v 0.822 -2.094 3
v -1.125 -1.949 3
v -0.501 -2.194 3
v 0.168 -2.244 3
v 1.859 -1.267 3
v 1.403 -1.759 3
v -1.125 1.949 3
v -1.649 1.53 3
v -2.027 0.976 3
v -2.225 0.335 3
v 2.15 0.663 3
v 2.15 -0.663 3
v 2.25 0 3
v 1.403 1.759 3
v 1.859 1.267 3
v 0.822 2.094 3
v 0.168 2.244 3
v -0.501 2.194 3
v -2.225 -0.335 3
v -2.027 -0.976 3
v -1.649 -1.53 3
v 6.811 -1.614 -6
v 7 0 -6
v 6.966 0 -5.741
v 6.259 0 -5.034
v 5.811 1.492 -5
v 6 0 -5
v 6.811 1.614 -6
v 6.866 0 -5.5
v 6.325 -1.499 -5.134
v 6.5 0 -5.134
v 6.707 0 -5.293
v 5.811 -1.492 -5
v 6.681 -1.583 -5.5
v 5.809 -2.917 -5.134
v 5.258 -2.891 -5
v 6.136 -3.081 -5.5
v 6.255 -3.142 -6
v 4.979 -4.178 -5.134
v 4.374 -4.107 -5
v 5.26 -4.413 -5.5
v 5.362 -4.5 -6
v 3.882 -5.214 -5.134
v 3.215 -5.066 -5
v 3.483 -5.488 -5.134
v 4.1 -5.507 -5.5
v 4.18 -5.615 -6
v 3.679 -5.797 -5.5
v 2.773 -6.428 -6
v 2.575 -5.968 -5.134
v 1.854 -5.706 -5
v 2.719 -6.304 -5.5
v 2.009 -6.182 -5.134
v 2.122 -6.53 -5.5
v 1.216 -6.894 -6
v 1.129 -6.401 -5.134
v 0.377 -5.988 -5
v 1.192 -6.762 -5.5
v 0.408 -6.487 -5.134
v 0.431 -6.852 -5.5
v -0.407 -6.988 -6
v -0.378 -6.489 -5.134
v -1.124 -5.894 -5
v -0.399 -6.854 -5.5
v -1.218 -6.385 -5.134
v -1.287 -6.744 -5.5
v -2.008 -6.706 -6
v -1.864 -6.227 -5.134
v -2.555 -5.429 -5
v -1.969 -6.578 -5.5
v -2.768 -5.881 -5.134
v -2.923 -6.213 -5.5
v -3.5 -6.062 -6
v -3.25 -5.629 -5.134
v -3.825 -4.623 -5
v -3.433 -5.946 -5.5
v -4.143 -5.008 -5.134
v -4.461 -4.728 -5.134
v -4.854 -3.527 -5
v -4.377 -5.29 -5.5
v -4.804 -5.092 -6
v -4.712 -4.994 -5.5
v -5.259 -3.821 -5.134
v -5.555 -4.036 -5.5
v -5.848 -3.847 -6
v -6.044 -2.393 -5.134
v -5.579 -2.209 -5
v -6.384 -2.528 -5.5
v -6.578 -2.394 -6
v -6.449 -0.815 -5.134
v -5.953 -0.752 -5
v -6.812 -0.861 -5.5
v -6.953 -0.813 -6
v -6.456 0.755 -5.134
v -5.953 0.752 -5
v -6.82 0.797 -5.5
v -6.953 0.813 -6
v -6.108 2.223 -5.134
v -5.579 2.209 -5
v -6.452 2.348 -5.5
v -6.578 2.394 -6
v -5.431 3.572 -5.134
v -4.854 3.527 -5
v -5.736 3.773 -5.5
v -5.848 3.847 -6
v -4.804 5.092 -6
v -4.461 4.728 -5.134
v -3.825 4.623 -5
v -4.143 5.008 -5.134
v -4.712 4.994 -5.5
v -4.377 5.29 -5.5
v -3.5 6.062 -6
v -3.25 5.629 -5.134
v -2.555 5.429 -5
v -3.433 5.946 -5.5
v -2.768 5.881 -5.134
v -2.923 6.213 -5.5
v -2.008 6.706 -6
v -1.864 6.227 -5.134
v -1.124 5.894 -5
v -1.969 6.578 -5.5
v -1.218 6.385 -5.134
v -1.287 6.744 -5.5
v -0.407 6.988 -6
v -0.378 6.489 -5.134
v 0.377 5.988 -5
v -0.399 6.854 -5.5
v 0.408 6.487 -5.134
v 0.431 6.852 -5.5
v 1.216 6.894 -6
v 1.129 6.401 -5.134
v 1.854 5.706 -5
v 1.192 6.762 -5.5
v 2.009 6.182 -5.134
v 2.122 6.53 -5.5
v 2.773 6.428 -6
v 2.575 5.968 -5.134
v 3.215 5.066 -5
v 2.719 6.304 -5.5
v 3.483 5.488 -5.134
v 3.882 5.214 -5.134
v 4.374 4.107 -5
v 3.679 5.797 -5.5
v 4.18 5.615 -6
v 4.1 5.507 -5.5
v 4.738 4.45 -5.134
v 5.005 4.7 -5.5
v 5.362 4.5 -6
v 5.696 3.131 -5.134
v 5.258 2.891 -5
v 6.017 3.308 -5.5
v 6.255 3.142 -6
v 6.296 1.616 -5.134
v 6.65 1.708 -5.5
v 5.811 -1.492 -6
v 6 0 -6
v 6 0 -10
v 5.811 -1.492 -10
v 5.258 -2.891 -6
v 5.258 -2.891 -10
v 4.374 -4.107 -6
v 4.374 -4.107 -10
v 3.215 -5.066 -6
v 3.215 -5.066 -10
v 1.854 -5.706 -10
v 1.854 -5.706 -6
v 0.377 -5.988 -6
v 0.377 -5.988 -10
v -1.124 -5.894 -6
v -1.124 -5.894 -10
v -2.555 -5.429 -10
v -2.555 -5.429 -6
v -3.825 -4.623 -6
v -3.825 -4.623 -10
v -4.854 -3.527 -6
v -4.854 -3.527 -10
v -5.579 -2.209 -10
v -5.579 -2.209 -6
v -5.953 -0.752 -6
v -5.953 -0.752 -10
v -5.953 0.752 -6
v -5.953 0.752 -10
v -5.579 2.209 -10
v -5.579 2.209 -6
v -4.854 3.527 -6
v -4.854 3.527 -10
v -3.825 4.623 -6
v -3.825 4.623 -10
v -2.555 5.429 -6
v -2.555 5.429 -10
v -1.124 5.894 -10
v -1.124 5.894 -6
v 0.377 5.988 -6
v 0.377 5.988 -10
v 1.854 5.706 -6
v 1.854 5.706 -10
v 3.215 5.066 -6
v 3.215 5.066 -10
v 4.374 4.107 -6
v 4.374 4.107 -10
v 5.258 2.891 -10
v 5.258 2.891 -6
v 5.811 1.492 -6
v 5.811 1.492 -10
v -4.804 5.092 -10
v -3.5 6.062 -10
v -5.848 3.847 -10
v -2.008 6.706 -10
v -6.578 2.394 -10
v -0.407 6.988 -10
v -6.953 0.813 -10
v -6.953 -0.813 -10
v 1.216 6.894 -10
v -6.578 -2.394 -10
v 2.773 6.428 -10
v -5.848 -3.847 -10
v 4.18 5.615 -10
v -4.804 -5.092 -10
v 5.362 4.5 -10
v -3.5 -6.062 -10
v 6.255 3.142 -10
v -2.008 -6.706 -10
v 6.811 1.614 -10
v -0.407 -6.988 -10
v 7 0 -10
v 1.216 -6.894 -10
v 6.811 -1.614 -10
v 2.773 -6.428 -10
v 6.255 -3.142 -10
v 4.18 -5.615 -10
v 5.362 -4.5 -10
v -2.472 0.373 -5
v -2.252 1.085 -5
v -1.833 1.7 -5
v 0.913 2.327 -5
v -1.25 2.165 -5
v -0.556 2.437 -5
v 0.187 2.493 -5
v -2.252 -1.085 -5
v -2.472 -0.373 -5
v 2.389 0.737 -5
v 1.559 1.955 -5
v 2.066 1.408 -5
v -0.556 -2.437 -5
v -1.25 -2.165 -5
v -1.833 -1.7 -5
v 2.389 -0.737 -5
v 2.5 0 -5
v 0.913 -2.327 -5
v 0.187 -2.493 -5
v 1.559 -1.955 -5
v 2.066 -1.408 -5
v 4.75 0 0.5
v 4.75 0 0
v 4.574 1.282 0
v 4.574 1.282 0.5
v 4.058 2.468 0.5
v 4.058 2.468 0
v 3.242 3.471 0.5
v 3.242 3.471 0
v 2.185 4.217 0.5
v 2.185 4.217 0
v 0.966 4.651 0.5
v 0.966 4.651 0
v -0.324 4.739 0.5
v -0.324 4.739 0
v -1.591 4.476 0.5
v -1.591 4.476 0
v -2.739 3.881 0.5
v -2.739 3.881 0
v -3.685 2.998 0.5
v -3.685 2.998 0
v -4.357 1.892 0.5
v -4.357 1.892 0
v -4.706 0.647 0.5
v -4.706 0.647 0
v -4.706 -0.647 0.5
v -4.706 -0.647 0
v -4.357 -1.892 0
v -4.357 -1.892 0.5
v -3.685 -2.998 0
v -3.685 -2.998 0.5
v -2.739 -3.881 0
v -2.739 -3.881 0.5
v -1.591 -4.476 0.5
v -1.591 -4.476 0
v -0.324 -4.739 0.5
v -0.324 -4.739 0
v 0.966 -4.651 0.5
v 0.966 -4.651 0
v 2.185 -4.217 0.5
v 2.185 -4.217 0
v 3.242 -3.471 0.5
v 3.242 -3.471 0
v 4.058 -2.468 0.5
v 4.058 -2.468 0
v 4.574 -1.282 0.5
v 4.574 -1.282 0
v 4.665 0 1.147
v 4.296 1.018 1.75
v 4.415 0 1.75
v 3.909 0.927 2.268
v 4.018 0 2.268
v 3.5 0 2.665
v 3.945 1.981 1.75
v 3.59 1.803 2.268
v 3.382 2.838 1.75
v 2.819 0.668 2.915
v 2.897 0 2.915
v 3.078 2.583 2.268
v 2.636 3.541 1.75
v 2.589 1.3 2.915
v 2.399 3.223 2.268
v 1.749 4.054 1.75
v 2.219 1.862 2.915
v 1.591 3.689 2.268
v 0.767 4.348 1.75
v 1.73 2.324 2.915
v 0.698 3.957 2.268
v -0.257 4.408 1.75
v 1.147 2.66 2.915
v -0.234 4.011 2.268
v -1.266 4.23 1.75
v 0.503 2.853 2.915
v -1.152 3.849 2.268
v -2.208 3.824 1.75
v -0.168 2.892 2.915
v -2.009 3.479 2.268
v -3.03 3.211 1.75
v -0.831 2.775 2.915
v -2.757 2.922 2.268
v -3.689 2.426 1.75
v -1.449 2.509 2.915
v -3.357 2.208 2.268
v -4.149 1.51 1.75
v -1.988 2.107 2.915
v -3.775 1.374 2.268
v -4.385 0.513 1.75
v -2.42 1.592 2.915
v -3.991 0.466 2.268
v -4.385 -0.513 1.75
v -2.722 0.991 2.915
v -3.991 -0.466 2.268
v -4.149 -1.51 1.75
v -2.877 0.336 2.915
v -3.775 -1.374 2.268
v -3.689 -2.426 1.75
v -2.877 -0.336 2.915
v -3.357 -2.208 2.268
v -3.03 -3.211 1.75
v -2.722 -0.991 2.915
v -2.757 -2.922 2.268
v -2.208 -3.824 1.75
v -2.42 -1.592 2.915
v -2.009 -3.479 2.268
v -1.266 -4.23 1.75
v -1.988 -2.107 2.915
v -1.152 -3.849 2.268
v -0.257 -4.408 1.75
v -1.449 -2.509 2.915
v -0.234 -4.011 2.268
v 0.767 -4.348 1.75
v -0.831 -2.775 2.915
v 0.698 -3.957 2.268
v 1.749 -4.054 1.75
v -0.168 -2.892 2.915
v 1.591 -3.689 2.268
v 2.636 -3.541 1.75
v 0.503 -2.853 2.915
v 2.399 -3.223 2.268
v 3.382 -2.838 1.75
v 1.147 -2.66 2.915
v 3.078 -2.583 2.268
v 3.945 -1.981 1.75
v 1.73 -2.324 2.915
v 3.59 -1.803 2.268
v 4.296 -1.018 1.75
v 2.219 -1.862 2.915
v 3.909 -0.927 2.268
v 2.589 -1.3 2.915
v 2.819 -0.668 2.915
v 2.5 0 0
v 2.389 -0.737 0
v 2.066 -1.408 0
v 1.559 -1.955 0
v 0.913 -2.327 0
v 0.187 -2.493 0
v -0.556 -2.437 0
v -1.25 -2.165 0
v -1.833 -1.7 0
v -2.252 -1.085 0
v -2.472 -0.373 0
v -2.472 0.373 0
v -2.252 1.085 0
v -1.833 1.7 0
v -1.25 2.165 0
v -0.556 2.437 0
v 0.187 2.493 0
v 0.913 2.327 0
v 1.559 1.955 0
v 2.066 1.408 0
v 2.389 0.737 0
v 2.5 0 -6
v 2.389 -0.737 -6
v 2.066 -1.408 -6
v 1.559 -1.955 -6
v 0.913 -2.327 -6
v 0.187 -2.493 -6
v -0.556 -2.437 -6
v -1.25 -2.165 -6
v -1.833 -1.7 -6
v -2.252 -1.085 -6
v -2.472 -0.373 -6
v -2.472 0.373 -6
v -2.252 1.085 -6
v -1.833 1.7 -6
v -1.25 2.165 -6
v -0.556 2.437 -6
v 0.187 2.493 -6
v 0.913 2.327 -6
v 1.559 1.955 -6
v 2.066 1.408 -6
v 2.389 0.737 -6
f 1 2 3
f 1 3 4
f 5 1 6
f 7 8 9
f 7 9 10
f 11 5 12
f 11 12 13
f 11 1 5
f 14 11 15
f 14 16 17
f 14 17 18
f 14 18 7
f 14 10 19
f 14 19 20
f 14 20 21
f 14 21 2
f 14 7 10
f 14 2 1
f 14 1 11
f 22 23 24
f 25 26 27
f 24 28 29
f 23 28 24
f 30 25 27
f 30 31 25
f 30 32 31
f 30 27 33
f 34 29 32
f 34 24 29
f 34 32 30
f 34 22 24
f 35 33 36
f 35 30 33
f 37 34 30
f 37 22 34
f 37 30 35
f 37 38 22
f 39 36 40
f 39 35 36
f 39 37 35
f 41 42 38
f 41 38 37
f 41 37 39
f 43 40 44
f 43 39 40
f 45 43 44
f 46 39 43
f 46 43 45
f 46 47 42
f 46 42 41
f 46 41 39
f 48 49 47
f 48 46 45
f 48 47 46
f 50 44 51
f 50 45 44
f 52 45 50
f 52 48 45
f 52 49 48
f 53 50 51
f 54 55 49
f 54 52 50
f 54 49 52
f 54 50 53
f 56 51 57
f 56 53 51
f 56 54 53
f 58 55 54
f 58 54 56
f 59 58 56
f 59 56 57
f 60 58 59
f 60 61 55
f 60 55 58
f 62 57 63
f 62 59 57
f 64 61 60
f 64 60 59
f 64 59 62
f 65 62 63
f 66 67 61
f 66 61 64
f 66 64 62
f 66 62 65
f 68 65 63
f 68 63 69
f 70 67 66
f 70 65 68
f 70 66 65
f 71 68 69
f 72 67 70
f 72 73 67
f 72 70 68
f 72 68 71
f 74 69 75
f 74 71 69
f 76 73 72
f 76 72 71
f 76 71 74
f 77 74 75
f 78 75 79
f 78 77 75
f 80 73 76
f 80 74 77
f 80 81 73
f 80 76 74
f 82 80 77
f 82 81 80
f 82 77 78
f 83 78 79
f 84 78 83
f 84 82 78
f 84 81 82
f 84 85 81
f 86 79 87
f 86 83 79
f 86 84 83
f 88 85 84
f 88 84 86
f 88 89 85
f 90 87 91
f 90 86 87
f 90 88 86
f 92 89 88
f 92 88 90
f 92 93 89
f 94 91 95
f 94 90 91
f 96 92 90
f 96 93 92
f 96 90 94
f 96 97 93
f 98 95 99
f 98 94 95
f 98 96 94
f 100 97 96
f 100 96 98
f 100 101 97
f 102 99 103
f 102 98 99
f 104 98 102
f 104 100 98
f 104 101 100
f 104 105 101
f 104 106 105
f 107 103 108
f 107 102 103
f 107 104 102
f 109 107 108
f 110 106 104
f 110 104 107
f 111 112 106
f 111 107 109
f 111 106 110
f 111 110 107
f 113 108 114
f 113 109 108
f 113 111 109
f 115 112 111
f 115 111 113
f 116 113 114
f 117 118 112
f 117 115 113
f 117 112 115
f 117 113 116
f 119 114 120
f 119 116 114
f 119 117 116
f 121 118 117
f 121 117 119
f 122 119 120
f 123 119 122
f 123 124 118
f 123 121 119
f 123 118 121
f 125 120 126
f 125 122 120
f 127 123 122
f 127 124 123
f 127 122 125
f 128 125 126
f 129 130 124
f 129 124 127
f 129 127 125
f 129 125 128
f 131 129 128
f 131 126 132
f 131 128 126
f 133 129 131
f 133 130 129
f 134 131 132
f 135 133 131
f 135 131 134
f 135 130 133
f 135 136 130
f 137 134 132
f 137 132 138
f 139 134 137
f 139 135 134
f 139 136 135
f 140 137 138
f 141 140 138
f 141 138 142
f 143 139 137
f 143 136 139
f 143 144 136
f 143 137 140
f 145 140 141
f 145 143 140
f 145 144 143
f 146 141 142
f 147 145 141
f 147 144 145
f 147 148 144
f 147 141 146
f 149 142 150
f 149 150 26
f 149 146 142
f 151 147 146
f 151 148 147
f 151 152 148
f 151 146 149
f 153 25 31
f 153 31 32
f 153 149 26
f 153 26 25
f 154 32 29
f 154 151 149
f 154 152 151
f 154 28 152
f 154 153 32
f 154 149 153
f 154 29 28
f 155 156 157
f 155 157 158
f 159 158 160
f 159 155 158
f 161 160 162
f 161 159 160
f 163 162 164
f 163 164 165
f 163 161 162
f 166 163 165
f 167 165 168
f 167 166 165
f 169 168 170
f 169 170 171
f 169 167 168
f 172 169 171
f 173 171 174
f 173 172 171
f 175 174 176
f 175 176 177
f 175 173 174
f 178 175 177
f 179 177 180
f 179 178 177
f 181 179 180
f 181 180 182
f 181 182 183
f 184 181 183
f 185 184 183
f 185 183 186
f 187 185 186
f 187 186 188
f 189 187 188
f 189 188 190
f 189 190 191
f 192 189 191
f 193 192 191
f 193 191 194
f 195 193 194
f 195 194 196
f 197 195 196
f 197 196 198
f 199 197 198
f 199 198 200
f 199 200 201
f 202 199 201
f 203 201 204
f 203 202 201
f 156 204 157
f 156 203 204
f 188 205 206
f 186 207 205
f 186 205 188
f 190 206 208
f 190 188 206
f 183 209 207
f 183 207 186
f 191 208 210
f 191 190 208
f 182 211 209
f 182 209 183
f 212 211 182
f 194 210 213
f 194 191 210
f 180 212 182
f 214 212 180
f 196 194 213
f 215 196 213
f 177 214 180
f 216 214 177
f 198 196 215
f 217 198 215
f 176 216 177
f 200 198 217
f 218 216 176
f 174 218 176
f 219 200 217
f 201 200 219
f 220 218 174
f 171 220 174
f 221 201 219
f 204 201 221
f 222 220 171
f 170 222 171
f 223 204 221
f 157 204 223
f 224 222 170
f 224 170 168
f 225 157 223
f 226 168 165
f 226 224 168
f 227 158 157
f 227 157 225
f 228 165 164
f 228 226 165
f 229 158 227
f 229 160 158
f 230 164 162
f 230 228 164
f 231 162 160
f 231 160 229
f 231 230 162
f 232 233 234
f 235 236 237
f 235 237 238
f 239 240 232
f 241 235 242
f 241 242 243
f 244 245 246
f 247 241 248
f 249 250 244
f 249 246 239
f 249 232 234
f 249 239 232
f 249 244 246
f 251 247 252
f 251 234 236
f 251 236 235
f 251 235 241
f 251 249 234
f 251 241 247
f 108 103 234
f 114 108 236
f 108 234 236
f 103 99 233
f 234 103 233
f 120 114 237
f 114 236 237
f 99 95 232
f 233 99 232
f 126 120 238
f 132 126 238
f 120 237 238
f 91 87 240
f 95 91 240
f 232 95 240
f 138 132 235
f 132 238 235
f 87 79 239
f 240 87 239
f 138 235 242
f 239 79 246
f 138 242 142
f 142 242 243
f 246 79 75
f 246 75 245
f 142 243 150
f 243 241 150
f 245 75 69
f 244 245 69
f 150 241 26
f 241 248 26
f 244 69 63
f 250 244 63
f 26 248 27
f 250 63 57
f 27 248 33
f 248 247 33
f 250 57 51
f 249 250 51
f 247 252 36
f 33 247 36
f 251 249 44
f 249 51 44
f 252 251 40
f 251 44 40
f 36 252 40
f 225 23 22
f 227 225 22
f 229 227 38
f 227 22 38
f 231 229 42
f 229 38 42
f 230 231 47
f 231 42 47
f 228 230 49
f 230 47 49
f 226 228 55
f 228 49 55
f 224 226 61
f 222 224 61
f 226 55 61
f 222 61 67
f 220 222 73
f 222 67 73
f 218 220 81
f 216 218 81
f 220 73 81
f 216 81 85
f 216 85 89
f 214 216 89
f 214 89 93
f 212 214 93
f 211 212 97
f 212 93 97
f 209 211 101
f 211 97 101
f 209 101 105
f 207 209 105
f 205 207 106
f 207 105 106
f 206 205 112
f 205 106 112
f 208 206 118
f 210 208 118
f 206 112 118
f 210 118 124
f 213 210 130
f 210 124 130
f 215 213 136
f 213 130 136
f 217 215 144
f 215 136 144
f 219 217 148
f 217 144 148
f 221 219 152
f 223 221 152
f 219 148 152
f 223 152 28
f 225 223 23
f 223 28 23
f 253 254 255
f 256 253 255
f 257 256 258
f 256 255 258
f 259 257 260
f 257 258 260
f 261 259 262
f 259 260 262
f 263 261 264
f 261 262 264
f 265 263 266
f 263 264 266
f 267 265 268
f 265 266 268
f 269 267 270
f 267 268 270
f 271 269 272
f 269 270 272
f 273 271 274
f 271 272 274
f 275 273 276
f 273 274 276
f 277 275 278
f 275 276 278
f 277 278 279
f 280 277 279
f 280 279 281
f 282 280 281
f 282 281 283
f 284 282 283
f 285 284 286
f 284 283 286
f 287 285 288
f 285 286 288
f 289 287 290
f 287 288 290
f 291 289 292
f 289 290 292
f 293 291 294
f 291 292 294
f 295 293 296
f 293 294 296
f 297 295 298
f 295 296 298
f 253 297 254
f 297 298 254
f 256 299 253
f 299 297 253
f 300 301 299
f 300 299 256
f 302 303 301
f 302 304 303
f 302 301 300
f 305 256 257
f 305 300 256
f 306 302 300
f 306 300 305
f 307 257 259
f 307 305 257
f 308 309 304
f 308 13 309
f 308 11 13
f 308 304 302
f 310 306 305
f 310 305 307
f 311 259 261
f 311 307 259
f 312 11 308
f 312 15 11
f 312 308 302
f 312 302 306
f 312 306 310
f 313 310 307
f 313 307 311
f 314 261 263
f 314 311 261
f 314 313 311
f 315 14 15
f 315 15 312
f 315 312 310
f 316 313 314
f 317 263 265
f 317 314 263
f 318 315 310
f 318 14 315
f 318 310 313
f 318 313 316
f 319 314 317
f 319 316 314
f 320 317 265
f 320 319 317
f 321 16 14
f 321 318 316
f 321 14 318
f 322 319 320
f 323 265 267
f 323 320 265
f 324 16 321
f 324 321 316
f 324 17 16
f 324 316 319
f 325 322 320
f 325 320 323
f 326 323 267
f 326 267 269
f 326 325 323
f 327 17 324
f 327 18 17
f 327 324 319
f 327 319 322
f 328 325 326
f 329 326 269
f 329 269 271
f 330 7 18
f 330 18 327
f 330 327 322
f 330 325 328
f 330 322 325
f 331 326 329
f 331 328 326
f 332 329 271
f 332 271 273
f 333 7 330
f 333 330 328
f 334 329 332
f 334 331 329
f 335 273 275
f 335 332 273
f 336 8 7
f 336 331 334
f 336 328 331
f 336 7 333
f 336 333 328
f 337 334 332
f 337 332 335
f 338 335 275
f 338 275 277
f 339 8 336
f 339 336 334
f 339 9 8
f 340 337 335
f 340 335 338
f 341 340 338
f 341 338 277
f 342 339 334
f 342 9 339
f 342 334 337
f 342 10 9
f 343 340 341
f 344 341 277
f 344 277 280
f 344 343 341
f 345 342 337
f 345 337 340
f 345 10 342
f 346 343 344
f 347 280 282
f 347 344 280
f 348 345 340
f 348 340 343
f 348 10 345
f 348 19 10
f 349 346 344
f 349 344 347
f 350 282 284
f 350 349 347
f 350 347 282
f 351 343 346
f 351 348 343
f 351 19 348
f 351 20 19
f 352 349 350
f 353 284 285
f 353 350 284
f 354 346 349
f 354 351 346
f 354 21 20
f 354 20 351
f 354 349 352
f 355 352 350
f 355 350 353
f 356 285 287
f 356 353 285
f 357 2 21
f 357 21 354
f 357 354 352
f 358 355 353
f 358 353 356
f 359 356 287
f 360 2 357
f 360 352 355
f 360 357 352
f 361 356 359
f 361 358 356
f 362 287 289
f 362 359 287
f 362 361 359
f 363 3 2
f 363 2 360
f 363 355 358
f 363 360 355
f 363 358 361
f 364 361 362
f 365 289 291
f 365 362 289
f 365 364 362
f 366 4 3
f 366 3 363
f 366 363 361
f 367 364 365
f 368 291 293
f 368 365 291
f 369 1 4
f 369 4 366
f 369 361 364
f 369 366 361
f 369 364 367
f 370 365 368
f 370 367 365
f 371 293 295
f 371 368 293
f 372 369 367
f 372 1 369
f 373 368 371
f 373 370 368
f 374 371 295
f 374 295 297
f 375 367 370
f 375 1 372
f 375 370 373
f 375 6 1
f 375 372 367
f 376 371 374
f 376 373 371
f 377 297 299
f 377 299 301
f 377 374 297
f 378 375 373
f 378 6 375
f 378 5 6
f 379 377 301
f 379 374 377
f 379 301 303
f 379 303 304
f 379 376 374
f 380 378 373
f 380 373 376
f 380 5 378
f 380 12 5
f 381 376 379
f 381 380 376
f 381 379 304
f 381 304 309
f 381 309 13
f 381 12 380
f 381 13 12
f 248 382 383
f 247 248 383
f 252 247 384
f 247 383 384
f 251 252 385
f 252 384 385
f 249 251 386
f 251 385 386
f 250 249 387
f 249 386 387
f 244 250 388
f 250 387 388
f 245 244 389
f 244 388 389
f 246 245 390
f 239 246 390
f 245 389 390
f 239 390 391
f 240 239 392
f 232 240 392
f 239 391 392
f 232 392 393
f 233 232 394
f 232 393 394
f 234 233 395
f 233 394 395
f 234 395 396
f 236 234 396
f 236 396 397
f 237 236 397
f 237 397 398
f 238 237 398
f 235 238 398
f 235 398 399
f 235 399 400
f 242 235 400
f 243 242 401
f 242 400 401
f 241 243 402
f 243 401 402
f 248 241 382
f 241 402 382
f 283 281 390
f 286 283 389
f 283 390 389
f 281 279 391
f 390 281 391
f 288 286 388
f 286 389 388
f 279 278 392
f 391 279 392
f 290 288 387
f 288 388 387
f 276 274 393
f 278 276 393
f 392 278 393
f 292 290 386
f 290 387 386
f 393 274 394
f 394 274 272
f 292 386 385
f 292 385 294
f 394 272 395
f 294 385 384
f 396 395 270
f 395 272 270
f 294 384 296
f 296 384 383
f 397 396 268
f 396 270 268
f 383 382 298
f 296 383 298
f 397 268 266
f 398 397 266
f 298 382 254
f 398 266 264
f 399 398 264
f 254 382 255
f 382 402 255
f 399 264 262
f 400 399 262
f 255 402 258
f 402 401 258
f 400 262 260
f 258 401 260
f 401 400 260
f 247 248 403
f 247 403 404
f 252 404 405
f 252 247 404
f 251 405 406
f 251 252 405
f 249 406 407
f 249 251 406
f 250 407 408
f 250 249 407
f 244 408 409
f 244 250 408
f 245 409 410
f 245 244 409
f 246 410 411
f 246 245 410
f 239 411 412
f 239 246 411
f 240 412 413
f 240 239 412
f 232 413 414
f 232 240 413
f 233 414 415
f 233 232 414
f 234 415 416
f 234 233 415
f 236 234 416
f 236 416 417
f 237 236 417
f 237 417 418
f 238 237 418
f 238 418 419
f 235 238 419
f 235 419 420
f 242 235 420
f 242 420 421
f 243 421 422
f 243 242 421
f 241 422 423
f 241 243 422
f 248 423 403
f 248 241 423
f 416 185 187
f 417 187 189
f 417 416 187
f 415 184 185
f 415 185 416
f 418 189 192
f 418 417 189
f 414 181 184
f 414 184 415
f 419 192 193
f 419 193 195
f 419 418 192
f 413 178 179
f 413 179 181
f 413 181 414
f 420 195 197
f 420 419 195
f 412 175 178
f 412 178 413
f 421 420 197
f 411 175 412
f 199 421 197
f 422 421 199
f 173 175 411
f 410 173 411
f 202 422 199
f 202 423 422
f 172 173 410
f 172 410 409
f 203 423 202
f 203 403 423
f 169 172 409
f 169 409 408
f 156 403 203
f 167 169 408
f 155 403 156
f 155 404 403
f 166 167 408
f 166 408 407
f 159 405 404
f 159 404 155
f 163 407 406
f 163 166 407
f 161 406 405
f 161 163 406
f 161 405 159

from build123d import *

# Parameters (mm, degrees)
F0_R     = 4.75
F1_DEPTH = 3
F2_R     = 2.5
F3_R     = 2.5
F4_DEPTH = 5
F5_R     = 7
F5_R_2   = 6
F6_DEPTH = 5
F7_R     = 6
F7_R_2   = 2.5
F8_DEPTH = 1
F9_R     = 1


with BuildPart() as f1:
    # F0 (on Top) → F1 (new body)
    with BuildSketch(Plane.XY):
        Circle(F0_R)
    extrude(amount=F1_DEPTH)

    # F2
    f2_edges = [f1.edges().sort_by_distance(p)[0] for p in [
        (-4.75, 0, 3),
    ]]
    fillet(f2_edges, radius=F2_R)

    # F3 (on face) → F4 (join)
    with BuildSketch(Plane(origin=(0, 0, 0), x_dir=(1, 0, 0), z_dir=(0, 0, -1))):
        Circle(F3_R)
    extrude(amount=F4_DEPTH)



with BuildPart() as f6:
    # F5 (on face) → F6 (new body)
    with BuildSketch(Plane(origin=(0, 0, -5), x_dir=(1, 0, 0), z_dir=(0, 0, -1))):
        Circle(F5_R)
        Circle(F5_R_2, mode=Mode.SUBTRACT)
    extrude(amount=F6_DEPTH)


with BuildPart() as f1_1:
    add(f1.part)

    add(f6.part)  # F8 merges F6
    # F7 (on face) → F8 (join)
    with BuildSketch(Plane(origin=(0, 0, -5), x_dir=(1, 0, 0), z_dir=(0, 0, -1))):
        Circle(F7_R)
        Circle(F7_R_2, mode=Mode.SUBTRACT)
    extrude(amount=F8_DEPTH)

    # F9
    f9_edges = [f1_1.edges().sort_by_distance(p)[0] for p in [
        (-7, 0, -5),
    ]]
    fillet(f9_edges, radius=F9_R)


solid = f1_1.part
